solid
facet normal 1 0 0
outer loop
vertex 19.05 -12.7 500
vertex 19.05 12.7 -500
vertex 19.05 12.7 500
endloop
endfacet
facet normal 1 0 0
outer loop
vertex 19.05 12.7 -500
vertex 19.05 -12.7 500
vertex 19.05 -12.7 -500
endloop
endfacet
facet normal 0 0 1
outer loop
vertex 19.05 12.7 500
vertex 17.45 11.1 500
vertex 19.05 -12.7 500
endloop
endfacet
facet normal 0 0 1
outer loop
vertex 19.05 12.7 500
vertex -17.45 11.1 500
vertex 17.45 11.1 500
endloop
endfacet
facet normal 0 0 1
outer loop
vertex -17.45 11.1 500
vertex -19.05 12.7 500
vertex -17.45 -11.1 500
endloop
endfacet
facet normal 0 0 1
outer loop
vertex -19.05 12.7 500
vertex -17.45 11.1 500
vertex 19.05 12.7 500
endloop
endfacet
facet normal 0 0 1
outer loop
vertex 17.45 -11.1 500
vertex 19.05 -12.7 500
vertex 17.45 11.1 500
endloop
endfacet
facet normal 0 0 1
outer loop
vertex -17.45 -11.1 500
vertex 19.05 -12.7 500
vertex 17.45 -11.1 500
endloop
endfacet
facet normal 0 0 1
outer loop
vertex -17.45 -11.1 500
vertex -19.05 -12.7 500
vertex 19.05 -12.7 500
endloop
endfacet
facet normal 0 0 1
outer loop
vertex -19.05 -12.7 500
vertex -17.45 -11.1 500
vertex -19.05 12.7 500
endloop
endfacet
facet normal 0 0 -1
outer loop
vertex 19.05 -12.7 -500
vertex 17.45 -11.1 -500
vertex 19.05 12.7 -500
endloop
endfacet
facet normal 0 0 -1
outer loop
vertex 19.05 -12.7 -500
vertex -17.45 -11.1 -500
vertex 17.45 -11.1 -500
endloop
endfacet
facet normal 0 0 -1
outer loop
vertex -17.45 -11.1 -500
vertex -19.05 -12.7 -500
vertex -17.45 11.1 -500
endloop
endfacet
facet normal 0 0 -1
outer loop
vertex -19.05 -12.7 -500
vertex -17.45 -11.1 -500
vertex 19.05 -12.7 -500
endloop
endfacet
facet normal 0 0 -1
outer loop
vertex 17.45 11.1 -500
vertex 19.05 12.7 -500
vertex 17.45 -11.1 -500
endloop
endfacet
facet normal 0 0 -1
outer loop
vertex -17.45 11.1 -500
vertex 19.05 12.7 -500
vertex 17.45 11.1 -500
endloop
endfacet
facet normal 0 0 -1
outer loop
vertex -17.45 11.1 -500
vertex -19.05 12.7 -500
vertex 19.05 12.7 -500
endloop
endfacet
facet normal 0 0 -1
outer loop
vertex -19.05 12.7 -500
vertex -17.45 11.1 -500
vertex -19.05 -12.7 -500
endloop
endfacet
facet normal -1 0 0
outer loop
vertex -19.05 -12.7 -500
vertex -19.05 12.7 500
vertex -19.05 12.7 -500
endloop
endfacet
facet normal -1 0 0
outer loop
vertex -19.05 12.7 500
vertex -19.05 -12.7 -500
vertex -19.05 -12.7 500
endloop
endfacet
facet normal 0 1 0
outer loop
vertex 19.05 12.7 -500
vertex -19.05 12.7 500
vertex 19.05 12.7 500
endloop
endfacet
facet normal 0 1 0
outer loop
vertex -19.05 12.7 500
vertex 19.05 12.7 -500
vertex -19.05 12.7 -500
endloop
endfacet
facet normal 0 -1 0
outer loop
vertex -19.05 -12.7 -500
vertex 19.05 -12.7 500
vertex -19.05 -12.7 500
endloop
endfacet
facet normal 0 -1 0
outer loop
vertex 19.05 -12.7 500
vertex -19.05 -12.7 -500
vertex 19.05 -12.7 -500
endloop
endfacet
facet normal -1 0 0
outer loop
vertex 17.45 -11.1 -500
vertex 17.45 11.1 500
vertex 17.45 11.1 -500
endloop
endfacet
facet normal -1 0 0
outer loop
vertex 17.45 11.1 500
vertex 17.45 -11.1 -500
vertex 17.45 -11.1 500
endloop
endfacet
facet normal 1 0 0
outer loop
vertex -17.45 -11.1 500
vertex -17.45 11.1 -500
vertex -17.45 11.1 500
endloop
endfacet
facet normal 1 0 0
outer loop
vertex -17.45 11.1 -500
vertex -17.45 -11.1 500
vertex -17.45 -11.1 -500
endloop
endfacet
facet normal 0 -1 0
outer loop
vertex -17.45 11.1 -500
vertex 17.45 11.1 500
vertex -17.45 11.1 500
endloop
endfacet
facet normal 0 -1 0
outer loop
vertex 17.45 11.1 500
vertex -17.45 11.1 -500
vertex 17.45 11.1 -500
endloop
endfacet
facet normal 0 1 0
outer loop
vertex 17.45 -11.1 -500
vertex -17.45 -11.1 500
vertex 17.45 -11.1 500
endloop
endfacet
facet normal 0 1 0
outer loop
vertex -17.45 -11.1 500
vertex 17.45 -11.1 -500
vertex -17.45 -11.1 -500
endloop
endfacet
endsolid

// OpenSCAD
// Aluminium rectangular box section: 38.1mm x 25.4mm x 1.6mm wall

// Parameters (mm)
outer_width     = 38.1;   // X
outer_height    = 25.4;   // Y
wall_thickness  = 1.6;    // wall
length          = 1000;   // Z
center_model    = true;   // true=centered on Z, false=base at Z=0
overlap         = 0.5;    // boolean robustness (mm)

// Derived inner dimensions
inner_width  = outer_width  - 2*wall_thickness;
inner_height = outer_height - 2*wall_thickness;

// Safety clamp
inner_width_safe  = max(0.01, inner_width);
inner_height_safe = max(0.01, inner_height);

module box_section_tube() {
    difference() {
        // Outer tube
        cube([outer_width, outer_height, length], center=true);

        // Inner void (slightly longer to guarantee clean subtraction)
        cube([inner_width_safe, inner_height_safe, length + 2*overlap], center=true);
    }
}

translate([0, 0, center_model ? 0 : length/2])
    box_section_tube();
